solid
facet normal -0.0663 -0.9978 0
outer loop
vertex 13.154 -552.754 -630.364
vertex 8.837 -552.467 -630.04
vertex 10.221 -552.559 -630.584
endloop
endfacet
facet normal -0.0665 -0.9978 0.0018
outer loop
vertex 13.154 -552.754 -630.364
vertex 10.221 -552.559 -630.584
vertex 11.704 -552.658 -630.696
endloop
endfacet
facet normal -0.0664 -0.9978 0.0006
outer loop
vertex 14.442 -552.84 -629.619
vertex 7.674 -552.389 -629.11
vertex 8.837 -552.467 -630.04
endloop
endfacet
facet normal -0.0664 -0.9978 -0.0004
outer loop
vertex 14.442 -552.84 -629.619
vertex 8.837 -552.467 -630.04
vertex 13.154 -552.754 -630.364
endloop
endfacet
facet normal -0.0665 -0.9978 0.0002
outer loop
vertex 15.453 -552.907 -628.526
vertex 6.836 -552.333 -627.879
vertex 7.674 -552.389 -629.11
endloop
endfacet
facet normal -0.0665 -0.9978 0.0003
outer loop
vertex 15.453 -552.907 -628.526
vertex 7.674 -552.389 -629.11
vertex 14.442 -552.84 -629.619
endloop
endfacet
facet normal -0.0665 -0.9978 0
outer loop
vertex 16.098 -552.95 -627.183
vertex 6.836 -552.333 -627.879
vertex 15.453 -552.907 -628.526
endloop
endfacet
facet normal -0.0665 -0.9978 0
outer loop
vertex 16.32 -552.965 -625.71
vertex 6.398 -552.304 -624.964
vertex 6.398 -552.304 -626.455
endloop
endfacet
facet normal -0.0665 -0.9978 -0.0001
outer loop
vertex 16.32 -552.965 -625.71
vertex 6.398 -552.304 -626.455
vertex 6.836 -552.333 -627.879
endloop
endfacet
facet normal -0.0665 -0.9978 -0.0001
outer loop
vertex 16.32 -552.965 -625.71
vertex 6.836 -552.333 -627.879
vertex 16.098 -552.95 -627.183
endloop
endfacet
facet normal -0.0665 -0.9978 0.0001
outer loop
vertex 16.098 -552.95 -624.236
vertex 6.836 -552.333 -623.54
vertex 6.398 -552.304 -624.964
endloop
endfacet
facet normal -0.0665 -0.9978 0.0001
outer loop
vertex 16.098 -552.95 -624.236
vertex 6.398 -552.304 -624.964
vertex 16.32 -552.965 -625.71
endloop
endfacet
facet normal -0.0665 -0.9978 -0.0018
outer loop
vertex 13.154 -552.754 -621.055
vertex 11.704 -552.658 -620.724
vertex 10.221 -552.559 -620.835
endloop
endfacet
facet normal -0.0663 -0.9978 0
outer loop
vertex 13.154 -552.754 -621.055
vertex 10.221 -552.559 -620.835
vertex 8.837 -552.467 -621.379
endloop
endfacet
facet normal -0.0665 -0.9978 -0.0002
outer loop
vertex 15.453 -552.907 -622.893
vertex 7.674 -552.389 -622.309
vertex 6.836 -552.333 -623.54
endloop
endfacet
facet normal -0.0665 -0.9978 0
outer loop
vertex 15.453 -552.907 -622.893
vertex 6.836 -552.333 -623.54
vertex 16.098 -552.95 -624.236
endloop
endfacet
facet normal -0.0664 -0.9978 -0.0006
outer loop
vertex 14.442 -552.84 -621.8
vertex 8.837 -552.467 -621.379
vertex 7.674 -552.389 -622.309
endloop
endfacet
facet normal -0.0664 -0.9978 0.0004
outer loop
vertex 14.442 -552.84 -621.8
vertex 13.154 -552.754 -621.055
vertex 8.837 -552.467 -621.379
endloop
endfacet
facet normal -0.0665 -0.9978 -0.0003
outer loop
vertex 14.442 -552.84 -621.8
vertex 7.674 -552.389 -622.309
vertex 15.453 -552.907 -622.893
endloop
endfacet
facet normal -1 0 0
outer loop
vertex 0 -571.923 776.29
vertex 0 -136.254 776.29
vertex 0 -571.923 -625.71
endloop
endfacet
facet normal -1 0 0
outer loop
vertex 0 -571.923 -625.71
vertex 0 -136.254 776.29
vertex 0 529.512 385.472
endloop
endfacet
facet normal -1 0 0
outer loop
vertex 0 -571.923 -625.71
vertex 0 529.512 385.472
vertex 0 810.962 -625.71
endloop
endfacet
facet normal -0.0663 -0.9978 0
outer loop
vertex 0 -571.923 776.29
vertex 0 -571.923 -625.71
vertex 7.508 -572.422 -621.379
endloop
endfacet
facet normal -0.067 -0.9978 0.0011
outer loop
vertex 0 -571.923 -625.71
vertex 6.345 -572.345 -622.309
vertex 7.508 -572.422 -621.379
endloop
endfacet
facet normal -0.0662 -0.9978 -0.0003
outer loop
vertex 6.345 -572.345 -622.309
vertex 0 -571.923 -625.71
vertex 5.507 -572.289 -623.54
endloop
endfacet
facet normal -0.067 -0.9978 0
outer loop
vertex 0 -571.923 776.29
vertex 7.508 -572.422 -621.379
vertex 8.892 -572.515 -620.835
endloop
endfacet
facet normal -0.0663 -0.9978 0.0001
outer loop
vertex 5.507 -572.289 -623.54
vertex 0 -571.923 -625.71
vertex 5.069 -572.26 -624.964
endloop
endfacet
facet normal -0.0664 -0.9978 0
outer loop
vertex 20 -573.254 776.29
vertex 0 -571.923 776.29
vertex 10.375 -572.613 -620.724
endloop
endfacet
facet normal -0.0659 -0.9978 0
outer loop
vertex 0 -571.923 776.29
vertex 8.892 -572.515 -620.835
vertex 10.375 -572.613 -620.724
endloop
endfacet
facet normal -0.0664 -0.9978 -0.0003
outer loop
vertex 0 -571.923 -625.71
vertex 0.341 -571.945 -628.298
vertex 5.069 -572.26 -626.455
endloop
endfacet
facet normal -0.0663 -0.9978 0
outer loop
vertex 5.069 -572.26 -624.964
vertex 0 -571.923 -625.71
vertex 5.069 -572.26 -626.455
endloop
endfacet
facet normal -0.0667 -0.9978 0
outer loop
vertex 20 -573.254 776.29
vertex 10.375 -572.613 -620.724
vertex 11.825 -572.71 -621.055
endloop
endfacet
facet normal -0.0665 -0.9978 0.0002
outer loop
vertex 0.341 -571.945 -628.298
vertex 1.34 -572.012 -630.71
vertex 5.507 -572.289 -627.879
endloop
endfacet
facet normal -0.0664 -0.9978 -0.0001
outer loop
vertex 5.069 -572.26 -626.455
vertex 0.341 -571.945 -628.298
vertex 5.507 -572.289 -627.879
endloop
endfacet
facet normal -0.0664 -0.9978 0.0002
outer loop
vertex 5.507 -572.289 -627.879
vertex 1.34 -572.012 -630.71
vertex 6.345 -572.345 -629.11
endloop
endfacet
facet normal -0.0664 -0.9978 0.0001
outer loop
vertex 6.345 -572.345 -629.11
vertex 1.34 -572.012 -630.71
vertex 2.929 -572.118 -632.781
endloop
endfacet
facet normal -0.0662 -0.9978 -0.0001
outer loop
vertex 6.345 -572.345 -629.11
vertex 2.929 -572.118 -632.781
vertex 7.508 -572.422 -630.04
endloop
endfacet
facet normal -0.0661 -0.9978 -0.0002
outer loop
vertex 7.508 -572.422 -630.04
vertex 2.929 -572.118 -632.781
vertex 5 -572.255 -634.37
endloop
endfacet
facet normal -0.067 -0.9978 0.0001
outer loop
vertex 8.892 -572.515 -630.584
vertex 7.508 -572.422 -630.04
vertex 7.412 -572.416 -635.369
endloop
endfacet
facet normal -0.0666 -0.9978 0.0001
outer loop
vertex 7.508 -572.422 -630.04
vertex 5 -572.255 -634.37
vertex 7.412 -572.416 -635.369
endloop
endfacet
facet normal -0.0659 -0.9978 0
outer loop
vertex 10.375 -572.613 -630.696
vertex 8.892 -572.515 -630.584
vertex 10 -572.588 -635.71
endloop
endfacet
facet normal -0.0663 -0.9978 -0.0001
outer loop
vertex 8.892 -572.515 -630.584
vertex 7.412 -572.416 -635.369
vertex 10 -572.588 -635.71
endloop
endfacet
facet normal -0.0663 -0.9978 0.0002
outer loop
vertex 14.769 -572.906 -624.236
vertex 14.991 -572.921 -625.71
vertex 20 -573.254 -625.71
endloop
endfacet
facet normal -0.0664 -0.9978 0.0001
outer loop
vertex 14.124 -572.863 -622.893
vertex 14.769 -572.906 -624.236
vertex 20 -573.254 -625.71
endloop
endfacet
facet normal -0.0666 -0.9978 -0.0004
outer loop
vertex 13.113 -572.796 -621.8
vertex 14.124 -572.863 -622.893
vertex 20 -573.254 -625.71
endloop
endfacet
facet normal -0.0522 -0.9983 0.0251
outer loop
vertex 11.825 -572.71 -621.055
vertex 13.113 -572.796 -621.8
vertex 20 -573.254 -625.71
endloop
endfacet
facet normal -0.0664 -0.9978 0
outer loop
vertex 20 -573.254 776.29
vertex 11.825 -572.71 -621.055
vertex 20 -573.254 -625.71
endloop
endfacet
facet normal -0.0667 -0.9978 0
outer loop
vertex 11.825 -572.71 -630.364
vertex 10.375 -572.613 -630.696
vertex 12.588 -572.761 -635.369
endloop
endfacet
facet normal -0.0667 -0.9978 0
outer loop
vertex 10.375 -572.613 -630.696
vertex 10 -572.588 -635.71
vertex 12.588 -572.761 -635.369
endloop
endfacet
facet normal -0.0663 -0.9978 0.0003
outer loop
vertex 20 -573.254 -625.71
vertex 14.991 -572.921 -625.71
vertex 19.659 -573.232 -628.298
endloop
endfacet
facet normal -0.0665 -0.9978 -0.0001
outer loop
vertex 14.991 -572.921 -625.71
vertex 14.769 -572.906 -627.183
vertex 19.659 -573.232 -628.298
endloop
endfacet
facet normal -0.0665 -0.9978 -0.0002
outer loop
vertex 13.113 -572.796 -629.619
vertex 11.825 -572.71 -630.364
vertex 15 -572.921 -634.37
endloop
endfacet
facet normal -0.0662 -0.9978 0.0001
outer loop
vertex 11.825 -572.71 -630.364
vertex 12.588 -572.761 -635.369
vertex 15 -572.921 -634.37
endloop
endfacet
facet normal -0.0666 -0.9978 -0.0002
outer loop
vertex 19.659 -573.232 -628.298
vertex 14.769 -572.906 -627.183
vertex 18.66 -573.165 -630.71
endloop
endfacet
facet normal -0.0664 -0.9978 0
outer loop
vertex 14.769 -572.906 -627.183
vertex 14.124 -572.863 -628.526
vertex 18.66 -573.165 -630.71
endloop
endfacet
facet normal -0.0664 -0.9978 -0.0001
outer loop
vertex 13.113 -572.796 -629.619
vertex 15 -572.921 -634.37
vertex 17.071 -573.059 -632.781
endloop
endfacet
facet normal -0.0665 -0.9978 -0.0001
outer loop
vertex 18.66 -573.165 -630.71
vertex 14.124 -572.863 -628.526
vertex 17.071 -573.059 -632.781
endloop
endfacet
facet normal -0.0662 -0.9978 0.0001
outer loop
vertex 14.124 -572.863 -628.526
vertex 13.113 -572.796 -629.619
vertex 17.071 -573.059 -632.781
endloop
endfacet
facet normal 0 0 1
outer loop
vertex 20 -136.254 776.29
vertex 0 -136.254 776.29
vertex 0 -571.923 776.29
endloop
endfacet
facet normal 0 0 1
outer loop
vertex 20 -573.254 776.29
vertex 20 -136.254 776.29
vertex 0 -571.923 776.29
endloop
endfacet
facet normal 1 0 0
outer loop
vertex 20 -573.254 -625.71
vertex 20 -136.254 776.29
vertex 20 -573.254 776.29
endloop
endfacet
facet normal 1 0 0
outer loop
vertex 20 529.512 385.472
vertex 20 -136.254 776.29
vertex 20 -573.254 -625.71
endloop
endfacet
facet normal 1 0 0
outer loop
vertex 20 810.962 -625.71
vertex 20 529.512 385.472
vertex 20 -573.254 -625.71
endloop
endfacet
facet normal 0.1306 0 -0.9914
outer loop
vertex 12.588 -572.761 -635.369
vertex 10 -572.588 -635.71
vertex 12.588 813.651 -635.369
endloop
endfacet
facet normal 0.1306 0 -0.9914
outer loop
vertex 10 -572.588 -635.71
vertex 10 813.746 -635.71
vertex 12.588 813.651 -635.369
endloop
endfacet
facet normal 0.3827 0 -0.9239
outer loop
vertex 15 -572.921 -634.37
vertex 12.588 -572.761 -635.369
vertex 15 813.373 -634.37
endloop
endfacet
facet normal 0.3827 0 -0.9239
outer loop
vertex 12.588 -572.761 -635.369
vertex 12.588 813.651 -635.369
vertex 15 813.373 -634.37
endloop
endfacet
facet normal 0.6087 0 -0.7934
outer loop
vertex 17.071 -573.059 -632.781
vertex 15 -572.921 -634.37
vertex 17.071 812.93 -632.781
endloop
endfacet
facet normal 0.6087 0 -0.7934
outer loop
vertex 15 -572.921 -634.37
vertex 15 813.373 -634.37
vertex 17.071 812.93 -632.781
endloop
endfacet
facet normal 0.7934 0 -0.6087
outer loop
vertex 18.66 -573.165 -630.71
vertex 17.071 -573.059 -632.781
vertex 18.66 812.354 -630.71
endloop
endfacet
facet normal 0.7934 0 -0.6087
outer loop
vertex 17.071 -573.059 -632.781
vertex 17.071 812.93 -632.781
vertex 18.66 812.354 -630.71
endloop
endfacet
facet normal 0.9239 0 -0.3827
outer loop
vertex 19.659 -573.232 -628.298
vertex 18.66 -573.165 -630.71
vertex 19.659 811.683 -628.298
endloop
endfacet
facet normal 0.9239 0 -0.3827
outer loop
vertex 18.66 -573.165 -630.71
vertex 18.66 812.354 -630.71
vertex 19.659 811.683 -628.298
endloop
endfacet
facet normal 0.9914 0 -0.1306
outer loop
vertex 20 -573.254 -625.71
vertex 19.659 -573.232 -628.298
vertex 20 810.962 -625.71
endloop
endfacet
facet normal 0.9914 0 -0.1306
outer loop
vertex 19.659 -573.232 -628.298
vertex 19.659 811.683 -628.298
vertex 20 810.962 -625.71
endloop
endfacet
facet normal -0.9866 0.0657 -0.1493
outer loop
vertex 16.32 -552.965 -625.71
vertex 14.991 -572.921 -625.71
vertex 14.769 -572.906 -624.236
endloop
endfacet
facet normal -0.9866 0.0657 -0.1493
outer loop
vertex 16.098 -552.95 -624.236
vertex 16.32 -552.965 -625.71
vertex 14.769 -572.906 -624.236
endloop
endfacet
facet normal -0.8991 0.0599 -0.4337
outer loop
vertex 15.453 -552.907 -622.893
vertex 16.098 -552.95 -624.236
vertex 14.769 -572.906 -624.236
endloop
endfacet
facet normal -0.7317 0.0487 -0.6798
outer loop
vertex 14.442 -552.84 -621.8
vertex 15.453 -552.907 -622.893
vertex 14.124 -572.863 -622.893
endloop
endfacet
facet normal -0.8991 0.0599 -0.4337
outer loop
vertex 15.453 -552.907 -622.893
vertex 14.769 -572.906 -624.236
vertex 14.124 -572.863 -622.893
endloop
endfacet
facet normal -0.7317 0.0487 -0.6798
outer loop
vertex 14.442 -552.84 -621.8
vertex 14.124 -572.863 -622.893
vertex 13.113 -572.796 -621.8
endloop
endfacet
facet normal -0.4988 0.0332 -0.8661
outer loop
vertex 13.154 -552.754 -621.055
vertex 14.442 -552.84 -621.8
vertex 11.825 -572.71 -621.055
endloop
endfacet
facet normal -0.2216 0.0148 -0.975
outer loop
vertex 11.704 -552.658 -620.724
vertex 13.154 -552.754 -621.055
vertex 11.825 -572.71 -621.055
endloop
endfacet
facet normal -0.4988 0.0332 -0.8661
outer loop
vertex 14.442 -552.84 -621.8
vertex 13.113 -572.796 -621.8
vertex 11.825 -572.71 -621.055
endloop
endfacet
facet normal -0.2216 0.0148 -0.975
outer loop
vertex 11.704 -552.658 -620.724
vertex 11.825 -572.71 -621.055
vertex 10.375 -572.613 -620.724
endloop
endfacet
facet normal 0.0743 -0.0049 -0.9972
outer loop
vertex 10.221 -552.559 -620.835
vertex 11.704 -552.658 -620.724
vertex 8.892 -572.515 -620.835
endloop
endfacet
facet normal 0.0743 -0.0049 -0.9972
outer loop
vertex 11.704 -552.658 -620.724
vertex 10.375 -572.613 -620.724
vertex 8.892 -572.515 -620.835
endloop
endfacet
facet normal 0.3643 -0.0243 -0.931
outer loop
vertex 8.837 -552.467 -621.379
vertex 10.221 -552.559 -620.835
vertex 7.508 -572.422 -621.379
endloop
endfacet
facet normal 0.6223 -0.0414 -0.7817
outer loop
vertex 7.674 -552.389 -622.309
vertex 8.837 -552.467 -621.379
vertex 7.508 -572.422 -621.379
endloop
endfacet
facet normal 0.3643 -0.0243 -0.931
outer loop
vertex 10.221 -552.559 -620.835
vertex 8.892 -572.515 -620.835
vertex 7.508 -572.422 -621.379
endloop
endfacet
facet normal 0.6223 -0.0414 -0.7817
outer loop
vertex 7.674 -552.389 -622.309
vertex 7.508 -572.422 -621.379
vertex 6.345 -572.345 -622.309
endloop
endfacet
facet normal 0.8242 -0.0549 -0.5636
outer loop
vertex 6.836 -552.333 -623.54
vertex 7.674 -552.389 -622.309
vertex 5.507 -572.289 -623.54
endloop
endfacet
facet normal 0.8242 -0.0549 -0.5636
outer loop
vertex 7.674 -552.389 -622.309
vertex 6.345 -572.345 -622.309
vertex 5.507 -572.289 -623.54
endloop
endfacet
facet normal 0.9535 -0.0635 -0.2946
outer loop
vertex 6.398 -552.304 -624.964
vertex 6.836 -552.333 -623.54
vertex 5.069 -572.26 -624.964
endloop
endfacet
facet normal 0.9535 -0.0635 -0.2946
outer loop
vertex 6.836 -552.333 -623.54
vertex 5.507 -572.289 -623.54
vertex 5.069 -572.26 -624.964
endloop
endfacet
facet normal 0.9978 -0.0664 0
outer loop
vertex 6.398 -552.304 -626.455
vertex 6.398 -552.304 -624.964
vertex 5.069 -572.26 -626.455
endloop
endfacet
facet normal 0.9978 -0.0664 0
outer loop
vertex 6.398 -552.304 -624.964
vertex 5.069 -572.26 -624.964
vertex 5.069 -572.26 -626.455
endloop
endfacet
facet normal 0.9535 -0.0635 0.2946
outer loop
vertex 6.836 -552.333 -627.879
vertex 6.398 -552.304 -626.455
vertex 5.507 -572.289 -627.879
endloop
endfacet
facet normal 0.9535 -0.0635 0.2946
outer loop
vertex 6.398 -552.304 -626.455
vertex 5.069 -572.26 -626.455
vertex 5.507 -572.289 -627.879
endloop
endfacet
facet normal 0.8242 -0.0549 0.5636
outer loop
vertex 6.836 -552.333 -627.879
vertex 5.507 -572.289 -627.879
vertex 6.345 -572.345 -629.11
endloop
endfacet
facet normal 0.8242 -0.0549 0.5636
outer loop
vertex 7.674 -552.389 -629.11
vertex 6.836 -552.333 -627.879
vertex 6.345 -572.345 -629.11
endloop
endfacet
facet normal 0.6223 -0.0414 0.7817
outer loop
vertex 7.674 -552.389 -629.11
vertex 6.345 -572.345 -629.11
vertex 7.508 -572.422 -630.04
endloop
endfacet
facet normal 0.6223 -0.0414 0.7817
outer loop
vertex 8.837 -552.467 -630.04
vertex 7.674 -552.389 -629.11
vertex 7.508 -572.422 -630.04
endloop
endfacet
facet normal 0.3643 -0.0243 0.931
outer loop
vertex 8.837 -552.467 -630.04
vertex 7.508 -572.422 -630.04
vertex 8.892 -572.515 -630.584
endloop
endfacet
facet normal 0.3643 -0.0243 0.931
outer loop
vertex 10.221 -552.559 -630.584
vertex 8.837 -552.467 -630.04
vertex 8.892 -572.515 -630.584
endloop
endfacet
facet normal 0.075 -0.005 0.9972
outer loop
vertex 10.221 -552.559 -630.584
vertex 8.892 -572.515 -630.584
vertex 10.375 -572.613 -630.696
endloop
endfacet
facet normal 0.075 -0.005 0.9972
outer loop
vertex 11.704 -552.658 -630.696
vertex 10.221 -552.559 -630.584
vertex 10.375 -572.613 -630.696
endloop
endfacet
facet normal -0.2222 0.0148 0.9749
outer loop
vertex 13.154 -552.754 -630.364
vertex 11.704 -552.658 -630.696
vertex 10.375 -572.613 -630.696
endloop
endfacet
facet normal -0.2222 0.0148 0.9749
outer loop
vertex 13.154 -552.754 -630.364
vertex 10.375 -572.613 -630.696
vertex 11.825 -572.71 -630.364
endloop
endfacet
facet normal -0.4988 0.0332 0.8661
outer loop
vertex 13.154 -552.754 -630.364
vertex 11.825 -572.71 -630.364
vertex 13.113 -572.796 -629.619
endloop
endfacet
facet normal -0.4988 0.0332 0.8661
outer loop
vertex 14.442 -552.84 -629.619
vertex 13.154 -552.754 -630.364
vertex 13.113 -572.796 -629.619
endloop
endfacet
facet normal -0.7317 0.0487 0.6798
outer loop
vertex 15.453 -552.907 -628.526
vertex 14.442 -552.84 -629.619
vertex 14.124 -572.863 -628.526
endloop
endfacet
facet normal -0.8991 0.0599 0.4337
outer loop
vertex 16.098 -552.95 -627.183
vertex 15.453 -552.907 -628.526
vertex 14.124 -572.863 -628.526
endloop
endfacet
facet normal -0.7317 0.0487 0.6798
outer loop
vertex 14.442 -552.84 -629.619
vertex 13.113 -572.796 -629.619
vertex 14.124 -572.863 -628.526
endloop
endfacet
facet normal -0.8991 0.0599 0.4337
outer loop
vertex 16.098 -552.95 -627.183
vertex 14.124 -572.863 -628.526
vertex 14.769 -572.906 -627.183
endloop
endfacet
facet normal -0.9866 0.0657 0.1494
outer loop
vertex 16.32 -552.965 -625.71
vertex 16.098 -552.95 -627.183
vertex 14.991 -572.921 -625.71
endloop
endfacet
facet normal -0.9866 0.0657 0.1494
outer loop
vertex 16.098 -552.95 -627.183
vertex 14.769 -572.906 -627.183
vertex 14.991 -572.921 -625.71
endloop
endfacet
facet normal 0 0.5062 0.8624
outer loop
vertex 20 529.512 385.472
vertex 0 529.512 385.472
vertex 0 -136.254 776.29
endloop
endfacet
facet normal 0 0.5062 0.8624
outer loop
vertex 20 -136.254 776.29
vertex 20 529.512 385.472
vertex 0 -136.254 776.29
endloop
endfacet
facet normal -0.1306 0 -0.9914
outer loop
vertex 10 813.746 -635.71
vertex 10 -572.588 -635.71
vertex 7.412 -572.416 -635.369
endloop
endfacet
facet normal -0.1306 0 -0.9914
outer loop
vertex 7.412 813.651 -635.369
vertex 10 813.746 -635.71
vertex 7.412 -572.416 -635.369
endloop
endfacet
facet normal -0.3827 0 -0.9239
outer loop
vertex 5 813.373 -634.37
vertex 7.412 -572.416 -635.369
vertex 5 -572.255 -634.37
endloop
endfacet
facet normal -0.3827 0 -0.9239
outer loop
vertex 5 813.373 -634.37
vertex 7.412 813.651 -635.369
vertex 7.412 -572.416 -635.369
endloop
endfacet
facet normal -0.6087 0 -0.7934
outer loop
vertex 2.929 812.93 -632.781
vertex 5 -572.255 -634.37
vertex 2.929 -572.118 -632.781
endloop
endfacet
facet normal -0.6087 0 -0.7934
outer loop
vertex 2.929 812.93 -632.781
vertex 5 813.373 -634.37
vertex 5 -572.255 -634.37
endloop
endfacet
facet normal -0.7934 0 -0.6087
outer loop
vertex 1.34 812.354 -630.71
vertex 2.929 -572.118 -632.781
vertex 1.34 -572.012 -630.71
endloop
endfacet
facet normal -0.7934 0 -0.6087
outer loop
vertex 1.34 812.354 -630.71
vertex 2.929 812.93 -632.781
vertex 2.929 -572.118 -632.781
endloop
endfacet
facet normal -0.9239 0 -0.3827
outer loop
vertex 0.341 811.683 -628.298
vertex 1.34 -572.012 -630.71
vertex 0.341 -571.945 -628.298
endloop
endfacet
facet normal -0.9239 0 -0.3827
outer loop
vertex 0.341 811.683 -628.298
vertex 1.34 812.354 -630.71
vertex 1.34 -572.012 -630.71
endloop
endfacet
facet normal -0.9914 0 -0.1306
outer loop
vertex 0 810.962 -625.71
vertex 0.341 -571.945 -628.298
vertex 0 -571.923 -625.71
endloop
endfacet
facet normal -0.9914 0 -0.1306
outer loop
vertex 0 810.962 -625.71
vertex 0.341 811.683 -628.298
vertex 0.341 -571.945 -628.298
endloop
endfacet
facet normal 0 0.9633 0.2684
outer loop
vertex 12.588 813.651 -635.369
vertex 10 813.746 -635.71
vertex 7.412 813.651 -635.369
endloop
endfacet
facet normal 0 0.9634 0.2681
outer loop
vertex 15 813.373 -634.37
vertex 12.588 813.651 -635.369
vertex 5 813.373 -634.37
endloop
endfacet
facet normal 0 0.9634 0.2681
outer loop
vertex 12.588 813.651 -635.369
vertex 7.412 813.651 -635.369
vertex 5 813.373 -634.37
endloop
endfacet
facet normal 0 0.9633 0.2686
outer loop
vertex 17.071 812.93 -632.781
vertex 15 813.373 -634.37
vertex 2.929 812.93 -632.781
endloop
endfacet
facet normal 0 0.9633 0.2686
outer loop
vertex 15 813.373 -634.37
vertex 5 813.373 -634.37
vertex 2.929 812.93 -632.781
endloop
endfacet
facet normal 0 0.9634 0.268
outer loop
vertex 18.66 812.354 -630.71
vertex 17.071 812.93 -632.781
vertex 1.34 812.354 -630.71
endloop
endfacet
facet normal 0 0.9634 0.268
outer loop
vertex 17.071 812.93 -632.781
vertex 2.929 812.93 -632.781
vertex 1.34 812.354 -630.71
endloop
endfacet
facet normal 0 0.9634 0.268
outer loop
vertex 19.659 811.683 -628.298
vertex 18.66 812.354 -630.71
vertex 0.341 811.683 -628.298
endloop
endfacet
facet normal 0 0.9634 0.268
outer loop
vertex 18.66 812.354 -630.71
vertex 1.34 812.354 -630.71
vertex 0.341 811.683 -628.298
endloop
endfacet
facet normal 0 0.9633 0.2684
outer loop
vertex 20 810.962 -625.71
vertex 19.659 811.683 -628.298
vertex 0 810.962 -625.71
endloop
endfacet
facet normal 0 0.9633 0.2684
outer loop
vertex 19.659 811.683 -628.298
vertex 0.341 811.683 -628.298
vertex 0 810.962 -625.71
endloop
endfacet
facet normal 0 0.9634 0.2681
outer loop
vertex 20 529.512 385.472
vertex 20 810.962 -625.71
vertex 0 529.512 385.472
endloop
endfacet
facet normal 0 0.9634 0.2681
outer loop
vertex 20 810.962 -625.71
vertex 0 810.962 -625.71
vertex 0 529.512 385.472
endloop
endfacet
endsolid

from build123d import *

# Parameters (mm, degrees)
BOSS_EXTRU_1_DEPTH           = 20
ENL_V_MAT_EXTRU_1_DEPTH      = 871
ENL_V_MAT_EXTRU_1_DEPTH_BACK = 792
ESQUISSE5_R                  = 5
ENL_V_MAT_EXTRU_2_DEPTH      = 20
CONG_1_R                     = 10


with BuildPart() as part:
    # Esquisse1 → Boss.-Extru.1 (new body)
    with BuildSketch(Plane(origin=(0, 0, 0), x_dir=(0, 0, -1), z_dir=(1, 0, 0))):
        Polygon((635.709590149, 813.74559194), (-385.471678665, 529.511856746), (-776.290409851, -136.25440806), (-776.290409851, -573.25440806), (635.709590149, -573.25440806), align=None)
    extrude(amount=BOSS_EXTRU_1_DEPTH)

    # Esquisse4 → Enlèv. mat.-Extru.1 (cut, two sides: drawn at the far end of the back side and taken through both)
    with BuildSketch(Plane.XY.offset(-ENL_V_MAT_EXTRU_1_DEPTH_BACK)):
        Polygon((0, -573.25440806), (0, -571.922503428), (20, -573.25440806), align=None)
    extrude(amount=ENL_V_MAT_EXTRU_1_DEPTH + ENL_V_MAT_EXTRU_1_DEPTH_BACK, mode=Mode.SUBTRACT)

    # Esquisse5 → Enlèv. mat.-Extru.2 (cut)
    with BuildSketch(Plane(origin=(-37.919143048, -569.397269313, 0), x_dir=(0.9977898861170226, -0.06644804859873017, 0), z_dir=(-0.06644804859873017, -0.9977898861170226, 0))):
        with Locations((48.027434489, -625.709590149)):
            Circle(ESQUISSE5_R)
    extrude(amount=-ENL_V_MAT_EXTRU_2_DEPTH, mode=Mode.SUBTRACT)

    # Congé1
    cong_1_edges = [part.edges().sort_by_distance(p)[0] for p in [
        (0, 120.911544256, -635.709590149),
        (20, 120.24559194, -635.709590149),
    ]]
    fillet(cong_1_edges, radius=CONG_1_R - 0.0001)  # a hair under: the kernel refuses the full size


solid = part.part
